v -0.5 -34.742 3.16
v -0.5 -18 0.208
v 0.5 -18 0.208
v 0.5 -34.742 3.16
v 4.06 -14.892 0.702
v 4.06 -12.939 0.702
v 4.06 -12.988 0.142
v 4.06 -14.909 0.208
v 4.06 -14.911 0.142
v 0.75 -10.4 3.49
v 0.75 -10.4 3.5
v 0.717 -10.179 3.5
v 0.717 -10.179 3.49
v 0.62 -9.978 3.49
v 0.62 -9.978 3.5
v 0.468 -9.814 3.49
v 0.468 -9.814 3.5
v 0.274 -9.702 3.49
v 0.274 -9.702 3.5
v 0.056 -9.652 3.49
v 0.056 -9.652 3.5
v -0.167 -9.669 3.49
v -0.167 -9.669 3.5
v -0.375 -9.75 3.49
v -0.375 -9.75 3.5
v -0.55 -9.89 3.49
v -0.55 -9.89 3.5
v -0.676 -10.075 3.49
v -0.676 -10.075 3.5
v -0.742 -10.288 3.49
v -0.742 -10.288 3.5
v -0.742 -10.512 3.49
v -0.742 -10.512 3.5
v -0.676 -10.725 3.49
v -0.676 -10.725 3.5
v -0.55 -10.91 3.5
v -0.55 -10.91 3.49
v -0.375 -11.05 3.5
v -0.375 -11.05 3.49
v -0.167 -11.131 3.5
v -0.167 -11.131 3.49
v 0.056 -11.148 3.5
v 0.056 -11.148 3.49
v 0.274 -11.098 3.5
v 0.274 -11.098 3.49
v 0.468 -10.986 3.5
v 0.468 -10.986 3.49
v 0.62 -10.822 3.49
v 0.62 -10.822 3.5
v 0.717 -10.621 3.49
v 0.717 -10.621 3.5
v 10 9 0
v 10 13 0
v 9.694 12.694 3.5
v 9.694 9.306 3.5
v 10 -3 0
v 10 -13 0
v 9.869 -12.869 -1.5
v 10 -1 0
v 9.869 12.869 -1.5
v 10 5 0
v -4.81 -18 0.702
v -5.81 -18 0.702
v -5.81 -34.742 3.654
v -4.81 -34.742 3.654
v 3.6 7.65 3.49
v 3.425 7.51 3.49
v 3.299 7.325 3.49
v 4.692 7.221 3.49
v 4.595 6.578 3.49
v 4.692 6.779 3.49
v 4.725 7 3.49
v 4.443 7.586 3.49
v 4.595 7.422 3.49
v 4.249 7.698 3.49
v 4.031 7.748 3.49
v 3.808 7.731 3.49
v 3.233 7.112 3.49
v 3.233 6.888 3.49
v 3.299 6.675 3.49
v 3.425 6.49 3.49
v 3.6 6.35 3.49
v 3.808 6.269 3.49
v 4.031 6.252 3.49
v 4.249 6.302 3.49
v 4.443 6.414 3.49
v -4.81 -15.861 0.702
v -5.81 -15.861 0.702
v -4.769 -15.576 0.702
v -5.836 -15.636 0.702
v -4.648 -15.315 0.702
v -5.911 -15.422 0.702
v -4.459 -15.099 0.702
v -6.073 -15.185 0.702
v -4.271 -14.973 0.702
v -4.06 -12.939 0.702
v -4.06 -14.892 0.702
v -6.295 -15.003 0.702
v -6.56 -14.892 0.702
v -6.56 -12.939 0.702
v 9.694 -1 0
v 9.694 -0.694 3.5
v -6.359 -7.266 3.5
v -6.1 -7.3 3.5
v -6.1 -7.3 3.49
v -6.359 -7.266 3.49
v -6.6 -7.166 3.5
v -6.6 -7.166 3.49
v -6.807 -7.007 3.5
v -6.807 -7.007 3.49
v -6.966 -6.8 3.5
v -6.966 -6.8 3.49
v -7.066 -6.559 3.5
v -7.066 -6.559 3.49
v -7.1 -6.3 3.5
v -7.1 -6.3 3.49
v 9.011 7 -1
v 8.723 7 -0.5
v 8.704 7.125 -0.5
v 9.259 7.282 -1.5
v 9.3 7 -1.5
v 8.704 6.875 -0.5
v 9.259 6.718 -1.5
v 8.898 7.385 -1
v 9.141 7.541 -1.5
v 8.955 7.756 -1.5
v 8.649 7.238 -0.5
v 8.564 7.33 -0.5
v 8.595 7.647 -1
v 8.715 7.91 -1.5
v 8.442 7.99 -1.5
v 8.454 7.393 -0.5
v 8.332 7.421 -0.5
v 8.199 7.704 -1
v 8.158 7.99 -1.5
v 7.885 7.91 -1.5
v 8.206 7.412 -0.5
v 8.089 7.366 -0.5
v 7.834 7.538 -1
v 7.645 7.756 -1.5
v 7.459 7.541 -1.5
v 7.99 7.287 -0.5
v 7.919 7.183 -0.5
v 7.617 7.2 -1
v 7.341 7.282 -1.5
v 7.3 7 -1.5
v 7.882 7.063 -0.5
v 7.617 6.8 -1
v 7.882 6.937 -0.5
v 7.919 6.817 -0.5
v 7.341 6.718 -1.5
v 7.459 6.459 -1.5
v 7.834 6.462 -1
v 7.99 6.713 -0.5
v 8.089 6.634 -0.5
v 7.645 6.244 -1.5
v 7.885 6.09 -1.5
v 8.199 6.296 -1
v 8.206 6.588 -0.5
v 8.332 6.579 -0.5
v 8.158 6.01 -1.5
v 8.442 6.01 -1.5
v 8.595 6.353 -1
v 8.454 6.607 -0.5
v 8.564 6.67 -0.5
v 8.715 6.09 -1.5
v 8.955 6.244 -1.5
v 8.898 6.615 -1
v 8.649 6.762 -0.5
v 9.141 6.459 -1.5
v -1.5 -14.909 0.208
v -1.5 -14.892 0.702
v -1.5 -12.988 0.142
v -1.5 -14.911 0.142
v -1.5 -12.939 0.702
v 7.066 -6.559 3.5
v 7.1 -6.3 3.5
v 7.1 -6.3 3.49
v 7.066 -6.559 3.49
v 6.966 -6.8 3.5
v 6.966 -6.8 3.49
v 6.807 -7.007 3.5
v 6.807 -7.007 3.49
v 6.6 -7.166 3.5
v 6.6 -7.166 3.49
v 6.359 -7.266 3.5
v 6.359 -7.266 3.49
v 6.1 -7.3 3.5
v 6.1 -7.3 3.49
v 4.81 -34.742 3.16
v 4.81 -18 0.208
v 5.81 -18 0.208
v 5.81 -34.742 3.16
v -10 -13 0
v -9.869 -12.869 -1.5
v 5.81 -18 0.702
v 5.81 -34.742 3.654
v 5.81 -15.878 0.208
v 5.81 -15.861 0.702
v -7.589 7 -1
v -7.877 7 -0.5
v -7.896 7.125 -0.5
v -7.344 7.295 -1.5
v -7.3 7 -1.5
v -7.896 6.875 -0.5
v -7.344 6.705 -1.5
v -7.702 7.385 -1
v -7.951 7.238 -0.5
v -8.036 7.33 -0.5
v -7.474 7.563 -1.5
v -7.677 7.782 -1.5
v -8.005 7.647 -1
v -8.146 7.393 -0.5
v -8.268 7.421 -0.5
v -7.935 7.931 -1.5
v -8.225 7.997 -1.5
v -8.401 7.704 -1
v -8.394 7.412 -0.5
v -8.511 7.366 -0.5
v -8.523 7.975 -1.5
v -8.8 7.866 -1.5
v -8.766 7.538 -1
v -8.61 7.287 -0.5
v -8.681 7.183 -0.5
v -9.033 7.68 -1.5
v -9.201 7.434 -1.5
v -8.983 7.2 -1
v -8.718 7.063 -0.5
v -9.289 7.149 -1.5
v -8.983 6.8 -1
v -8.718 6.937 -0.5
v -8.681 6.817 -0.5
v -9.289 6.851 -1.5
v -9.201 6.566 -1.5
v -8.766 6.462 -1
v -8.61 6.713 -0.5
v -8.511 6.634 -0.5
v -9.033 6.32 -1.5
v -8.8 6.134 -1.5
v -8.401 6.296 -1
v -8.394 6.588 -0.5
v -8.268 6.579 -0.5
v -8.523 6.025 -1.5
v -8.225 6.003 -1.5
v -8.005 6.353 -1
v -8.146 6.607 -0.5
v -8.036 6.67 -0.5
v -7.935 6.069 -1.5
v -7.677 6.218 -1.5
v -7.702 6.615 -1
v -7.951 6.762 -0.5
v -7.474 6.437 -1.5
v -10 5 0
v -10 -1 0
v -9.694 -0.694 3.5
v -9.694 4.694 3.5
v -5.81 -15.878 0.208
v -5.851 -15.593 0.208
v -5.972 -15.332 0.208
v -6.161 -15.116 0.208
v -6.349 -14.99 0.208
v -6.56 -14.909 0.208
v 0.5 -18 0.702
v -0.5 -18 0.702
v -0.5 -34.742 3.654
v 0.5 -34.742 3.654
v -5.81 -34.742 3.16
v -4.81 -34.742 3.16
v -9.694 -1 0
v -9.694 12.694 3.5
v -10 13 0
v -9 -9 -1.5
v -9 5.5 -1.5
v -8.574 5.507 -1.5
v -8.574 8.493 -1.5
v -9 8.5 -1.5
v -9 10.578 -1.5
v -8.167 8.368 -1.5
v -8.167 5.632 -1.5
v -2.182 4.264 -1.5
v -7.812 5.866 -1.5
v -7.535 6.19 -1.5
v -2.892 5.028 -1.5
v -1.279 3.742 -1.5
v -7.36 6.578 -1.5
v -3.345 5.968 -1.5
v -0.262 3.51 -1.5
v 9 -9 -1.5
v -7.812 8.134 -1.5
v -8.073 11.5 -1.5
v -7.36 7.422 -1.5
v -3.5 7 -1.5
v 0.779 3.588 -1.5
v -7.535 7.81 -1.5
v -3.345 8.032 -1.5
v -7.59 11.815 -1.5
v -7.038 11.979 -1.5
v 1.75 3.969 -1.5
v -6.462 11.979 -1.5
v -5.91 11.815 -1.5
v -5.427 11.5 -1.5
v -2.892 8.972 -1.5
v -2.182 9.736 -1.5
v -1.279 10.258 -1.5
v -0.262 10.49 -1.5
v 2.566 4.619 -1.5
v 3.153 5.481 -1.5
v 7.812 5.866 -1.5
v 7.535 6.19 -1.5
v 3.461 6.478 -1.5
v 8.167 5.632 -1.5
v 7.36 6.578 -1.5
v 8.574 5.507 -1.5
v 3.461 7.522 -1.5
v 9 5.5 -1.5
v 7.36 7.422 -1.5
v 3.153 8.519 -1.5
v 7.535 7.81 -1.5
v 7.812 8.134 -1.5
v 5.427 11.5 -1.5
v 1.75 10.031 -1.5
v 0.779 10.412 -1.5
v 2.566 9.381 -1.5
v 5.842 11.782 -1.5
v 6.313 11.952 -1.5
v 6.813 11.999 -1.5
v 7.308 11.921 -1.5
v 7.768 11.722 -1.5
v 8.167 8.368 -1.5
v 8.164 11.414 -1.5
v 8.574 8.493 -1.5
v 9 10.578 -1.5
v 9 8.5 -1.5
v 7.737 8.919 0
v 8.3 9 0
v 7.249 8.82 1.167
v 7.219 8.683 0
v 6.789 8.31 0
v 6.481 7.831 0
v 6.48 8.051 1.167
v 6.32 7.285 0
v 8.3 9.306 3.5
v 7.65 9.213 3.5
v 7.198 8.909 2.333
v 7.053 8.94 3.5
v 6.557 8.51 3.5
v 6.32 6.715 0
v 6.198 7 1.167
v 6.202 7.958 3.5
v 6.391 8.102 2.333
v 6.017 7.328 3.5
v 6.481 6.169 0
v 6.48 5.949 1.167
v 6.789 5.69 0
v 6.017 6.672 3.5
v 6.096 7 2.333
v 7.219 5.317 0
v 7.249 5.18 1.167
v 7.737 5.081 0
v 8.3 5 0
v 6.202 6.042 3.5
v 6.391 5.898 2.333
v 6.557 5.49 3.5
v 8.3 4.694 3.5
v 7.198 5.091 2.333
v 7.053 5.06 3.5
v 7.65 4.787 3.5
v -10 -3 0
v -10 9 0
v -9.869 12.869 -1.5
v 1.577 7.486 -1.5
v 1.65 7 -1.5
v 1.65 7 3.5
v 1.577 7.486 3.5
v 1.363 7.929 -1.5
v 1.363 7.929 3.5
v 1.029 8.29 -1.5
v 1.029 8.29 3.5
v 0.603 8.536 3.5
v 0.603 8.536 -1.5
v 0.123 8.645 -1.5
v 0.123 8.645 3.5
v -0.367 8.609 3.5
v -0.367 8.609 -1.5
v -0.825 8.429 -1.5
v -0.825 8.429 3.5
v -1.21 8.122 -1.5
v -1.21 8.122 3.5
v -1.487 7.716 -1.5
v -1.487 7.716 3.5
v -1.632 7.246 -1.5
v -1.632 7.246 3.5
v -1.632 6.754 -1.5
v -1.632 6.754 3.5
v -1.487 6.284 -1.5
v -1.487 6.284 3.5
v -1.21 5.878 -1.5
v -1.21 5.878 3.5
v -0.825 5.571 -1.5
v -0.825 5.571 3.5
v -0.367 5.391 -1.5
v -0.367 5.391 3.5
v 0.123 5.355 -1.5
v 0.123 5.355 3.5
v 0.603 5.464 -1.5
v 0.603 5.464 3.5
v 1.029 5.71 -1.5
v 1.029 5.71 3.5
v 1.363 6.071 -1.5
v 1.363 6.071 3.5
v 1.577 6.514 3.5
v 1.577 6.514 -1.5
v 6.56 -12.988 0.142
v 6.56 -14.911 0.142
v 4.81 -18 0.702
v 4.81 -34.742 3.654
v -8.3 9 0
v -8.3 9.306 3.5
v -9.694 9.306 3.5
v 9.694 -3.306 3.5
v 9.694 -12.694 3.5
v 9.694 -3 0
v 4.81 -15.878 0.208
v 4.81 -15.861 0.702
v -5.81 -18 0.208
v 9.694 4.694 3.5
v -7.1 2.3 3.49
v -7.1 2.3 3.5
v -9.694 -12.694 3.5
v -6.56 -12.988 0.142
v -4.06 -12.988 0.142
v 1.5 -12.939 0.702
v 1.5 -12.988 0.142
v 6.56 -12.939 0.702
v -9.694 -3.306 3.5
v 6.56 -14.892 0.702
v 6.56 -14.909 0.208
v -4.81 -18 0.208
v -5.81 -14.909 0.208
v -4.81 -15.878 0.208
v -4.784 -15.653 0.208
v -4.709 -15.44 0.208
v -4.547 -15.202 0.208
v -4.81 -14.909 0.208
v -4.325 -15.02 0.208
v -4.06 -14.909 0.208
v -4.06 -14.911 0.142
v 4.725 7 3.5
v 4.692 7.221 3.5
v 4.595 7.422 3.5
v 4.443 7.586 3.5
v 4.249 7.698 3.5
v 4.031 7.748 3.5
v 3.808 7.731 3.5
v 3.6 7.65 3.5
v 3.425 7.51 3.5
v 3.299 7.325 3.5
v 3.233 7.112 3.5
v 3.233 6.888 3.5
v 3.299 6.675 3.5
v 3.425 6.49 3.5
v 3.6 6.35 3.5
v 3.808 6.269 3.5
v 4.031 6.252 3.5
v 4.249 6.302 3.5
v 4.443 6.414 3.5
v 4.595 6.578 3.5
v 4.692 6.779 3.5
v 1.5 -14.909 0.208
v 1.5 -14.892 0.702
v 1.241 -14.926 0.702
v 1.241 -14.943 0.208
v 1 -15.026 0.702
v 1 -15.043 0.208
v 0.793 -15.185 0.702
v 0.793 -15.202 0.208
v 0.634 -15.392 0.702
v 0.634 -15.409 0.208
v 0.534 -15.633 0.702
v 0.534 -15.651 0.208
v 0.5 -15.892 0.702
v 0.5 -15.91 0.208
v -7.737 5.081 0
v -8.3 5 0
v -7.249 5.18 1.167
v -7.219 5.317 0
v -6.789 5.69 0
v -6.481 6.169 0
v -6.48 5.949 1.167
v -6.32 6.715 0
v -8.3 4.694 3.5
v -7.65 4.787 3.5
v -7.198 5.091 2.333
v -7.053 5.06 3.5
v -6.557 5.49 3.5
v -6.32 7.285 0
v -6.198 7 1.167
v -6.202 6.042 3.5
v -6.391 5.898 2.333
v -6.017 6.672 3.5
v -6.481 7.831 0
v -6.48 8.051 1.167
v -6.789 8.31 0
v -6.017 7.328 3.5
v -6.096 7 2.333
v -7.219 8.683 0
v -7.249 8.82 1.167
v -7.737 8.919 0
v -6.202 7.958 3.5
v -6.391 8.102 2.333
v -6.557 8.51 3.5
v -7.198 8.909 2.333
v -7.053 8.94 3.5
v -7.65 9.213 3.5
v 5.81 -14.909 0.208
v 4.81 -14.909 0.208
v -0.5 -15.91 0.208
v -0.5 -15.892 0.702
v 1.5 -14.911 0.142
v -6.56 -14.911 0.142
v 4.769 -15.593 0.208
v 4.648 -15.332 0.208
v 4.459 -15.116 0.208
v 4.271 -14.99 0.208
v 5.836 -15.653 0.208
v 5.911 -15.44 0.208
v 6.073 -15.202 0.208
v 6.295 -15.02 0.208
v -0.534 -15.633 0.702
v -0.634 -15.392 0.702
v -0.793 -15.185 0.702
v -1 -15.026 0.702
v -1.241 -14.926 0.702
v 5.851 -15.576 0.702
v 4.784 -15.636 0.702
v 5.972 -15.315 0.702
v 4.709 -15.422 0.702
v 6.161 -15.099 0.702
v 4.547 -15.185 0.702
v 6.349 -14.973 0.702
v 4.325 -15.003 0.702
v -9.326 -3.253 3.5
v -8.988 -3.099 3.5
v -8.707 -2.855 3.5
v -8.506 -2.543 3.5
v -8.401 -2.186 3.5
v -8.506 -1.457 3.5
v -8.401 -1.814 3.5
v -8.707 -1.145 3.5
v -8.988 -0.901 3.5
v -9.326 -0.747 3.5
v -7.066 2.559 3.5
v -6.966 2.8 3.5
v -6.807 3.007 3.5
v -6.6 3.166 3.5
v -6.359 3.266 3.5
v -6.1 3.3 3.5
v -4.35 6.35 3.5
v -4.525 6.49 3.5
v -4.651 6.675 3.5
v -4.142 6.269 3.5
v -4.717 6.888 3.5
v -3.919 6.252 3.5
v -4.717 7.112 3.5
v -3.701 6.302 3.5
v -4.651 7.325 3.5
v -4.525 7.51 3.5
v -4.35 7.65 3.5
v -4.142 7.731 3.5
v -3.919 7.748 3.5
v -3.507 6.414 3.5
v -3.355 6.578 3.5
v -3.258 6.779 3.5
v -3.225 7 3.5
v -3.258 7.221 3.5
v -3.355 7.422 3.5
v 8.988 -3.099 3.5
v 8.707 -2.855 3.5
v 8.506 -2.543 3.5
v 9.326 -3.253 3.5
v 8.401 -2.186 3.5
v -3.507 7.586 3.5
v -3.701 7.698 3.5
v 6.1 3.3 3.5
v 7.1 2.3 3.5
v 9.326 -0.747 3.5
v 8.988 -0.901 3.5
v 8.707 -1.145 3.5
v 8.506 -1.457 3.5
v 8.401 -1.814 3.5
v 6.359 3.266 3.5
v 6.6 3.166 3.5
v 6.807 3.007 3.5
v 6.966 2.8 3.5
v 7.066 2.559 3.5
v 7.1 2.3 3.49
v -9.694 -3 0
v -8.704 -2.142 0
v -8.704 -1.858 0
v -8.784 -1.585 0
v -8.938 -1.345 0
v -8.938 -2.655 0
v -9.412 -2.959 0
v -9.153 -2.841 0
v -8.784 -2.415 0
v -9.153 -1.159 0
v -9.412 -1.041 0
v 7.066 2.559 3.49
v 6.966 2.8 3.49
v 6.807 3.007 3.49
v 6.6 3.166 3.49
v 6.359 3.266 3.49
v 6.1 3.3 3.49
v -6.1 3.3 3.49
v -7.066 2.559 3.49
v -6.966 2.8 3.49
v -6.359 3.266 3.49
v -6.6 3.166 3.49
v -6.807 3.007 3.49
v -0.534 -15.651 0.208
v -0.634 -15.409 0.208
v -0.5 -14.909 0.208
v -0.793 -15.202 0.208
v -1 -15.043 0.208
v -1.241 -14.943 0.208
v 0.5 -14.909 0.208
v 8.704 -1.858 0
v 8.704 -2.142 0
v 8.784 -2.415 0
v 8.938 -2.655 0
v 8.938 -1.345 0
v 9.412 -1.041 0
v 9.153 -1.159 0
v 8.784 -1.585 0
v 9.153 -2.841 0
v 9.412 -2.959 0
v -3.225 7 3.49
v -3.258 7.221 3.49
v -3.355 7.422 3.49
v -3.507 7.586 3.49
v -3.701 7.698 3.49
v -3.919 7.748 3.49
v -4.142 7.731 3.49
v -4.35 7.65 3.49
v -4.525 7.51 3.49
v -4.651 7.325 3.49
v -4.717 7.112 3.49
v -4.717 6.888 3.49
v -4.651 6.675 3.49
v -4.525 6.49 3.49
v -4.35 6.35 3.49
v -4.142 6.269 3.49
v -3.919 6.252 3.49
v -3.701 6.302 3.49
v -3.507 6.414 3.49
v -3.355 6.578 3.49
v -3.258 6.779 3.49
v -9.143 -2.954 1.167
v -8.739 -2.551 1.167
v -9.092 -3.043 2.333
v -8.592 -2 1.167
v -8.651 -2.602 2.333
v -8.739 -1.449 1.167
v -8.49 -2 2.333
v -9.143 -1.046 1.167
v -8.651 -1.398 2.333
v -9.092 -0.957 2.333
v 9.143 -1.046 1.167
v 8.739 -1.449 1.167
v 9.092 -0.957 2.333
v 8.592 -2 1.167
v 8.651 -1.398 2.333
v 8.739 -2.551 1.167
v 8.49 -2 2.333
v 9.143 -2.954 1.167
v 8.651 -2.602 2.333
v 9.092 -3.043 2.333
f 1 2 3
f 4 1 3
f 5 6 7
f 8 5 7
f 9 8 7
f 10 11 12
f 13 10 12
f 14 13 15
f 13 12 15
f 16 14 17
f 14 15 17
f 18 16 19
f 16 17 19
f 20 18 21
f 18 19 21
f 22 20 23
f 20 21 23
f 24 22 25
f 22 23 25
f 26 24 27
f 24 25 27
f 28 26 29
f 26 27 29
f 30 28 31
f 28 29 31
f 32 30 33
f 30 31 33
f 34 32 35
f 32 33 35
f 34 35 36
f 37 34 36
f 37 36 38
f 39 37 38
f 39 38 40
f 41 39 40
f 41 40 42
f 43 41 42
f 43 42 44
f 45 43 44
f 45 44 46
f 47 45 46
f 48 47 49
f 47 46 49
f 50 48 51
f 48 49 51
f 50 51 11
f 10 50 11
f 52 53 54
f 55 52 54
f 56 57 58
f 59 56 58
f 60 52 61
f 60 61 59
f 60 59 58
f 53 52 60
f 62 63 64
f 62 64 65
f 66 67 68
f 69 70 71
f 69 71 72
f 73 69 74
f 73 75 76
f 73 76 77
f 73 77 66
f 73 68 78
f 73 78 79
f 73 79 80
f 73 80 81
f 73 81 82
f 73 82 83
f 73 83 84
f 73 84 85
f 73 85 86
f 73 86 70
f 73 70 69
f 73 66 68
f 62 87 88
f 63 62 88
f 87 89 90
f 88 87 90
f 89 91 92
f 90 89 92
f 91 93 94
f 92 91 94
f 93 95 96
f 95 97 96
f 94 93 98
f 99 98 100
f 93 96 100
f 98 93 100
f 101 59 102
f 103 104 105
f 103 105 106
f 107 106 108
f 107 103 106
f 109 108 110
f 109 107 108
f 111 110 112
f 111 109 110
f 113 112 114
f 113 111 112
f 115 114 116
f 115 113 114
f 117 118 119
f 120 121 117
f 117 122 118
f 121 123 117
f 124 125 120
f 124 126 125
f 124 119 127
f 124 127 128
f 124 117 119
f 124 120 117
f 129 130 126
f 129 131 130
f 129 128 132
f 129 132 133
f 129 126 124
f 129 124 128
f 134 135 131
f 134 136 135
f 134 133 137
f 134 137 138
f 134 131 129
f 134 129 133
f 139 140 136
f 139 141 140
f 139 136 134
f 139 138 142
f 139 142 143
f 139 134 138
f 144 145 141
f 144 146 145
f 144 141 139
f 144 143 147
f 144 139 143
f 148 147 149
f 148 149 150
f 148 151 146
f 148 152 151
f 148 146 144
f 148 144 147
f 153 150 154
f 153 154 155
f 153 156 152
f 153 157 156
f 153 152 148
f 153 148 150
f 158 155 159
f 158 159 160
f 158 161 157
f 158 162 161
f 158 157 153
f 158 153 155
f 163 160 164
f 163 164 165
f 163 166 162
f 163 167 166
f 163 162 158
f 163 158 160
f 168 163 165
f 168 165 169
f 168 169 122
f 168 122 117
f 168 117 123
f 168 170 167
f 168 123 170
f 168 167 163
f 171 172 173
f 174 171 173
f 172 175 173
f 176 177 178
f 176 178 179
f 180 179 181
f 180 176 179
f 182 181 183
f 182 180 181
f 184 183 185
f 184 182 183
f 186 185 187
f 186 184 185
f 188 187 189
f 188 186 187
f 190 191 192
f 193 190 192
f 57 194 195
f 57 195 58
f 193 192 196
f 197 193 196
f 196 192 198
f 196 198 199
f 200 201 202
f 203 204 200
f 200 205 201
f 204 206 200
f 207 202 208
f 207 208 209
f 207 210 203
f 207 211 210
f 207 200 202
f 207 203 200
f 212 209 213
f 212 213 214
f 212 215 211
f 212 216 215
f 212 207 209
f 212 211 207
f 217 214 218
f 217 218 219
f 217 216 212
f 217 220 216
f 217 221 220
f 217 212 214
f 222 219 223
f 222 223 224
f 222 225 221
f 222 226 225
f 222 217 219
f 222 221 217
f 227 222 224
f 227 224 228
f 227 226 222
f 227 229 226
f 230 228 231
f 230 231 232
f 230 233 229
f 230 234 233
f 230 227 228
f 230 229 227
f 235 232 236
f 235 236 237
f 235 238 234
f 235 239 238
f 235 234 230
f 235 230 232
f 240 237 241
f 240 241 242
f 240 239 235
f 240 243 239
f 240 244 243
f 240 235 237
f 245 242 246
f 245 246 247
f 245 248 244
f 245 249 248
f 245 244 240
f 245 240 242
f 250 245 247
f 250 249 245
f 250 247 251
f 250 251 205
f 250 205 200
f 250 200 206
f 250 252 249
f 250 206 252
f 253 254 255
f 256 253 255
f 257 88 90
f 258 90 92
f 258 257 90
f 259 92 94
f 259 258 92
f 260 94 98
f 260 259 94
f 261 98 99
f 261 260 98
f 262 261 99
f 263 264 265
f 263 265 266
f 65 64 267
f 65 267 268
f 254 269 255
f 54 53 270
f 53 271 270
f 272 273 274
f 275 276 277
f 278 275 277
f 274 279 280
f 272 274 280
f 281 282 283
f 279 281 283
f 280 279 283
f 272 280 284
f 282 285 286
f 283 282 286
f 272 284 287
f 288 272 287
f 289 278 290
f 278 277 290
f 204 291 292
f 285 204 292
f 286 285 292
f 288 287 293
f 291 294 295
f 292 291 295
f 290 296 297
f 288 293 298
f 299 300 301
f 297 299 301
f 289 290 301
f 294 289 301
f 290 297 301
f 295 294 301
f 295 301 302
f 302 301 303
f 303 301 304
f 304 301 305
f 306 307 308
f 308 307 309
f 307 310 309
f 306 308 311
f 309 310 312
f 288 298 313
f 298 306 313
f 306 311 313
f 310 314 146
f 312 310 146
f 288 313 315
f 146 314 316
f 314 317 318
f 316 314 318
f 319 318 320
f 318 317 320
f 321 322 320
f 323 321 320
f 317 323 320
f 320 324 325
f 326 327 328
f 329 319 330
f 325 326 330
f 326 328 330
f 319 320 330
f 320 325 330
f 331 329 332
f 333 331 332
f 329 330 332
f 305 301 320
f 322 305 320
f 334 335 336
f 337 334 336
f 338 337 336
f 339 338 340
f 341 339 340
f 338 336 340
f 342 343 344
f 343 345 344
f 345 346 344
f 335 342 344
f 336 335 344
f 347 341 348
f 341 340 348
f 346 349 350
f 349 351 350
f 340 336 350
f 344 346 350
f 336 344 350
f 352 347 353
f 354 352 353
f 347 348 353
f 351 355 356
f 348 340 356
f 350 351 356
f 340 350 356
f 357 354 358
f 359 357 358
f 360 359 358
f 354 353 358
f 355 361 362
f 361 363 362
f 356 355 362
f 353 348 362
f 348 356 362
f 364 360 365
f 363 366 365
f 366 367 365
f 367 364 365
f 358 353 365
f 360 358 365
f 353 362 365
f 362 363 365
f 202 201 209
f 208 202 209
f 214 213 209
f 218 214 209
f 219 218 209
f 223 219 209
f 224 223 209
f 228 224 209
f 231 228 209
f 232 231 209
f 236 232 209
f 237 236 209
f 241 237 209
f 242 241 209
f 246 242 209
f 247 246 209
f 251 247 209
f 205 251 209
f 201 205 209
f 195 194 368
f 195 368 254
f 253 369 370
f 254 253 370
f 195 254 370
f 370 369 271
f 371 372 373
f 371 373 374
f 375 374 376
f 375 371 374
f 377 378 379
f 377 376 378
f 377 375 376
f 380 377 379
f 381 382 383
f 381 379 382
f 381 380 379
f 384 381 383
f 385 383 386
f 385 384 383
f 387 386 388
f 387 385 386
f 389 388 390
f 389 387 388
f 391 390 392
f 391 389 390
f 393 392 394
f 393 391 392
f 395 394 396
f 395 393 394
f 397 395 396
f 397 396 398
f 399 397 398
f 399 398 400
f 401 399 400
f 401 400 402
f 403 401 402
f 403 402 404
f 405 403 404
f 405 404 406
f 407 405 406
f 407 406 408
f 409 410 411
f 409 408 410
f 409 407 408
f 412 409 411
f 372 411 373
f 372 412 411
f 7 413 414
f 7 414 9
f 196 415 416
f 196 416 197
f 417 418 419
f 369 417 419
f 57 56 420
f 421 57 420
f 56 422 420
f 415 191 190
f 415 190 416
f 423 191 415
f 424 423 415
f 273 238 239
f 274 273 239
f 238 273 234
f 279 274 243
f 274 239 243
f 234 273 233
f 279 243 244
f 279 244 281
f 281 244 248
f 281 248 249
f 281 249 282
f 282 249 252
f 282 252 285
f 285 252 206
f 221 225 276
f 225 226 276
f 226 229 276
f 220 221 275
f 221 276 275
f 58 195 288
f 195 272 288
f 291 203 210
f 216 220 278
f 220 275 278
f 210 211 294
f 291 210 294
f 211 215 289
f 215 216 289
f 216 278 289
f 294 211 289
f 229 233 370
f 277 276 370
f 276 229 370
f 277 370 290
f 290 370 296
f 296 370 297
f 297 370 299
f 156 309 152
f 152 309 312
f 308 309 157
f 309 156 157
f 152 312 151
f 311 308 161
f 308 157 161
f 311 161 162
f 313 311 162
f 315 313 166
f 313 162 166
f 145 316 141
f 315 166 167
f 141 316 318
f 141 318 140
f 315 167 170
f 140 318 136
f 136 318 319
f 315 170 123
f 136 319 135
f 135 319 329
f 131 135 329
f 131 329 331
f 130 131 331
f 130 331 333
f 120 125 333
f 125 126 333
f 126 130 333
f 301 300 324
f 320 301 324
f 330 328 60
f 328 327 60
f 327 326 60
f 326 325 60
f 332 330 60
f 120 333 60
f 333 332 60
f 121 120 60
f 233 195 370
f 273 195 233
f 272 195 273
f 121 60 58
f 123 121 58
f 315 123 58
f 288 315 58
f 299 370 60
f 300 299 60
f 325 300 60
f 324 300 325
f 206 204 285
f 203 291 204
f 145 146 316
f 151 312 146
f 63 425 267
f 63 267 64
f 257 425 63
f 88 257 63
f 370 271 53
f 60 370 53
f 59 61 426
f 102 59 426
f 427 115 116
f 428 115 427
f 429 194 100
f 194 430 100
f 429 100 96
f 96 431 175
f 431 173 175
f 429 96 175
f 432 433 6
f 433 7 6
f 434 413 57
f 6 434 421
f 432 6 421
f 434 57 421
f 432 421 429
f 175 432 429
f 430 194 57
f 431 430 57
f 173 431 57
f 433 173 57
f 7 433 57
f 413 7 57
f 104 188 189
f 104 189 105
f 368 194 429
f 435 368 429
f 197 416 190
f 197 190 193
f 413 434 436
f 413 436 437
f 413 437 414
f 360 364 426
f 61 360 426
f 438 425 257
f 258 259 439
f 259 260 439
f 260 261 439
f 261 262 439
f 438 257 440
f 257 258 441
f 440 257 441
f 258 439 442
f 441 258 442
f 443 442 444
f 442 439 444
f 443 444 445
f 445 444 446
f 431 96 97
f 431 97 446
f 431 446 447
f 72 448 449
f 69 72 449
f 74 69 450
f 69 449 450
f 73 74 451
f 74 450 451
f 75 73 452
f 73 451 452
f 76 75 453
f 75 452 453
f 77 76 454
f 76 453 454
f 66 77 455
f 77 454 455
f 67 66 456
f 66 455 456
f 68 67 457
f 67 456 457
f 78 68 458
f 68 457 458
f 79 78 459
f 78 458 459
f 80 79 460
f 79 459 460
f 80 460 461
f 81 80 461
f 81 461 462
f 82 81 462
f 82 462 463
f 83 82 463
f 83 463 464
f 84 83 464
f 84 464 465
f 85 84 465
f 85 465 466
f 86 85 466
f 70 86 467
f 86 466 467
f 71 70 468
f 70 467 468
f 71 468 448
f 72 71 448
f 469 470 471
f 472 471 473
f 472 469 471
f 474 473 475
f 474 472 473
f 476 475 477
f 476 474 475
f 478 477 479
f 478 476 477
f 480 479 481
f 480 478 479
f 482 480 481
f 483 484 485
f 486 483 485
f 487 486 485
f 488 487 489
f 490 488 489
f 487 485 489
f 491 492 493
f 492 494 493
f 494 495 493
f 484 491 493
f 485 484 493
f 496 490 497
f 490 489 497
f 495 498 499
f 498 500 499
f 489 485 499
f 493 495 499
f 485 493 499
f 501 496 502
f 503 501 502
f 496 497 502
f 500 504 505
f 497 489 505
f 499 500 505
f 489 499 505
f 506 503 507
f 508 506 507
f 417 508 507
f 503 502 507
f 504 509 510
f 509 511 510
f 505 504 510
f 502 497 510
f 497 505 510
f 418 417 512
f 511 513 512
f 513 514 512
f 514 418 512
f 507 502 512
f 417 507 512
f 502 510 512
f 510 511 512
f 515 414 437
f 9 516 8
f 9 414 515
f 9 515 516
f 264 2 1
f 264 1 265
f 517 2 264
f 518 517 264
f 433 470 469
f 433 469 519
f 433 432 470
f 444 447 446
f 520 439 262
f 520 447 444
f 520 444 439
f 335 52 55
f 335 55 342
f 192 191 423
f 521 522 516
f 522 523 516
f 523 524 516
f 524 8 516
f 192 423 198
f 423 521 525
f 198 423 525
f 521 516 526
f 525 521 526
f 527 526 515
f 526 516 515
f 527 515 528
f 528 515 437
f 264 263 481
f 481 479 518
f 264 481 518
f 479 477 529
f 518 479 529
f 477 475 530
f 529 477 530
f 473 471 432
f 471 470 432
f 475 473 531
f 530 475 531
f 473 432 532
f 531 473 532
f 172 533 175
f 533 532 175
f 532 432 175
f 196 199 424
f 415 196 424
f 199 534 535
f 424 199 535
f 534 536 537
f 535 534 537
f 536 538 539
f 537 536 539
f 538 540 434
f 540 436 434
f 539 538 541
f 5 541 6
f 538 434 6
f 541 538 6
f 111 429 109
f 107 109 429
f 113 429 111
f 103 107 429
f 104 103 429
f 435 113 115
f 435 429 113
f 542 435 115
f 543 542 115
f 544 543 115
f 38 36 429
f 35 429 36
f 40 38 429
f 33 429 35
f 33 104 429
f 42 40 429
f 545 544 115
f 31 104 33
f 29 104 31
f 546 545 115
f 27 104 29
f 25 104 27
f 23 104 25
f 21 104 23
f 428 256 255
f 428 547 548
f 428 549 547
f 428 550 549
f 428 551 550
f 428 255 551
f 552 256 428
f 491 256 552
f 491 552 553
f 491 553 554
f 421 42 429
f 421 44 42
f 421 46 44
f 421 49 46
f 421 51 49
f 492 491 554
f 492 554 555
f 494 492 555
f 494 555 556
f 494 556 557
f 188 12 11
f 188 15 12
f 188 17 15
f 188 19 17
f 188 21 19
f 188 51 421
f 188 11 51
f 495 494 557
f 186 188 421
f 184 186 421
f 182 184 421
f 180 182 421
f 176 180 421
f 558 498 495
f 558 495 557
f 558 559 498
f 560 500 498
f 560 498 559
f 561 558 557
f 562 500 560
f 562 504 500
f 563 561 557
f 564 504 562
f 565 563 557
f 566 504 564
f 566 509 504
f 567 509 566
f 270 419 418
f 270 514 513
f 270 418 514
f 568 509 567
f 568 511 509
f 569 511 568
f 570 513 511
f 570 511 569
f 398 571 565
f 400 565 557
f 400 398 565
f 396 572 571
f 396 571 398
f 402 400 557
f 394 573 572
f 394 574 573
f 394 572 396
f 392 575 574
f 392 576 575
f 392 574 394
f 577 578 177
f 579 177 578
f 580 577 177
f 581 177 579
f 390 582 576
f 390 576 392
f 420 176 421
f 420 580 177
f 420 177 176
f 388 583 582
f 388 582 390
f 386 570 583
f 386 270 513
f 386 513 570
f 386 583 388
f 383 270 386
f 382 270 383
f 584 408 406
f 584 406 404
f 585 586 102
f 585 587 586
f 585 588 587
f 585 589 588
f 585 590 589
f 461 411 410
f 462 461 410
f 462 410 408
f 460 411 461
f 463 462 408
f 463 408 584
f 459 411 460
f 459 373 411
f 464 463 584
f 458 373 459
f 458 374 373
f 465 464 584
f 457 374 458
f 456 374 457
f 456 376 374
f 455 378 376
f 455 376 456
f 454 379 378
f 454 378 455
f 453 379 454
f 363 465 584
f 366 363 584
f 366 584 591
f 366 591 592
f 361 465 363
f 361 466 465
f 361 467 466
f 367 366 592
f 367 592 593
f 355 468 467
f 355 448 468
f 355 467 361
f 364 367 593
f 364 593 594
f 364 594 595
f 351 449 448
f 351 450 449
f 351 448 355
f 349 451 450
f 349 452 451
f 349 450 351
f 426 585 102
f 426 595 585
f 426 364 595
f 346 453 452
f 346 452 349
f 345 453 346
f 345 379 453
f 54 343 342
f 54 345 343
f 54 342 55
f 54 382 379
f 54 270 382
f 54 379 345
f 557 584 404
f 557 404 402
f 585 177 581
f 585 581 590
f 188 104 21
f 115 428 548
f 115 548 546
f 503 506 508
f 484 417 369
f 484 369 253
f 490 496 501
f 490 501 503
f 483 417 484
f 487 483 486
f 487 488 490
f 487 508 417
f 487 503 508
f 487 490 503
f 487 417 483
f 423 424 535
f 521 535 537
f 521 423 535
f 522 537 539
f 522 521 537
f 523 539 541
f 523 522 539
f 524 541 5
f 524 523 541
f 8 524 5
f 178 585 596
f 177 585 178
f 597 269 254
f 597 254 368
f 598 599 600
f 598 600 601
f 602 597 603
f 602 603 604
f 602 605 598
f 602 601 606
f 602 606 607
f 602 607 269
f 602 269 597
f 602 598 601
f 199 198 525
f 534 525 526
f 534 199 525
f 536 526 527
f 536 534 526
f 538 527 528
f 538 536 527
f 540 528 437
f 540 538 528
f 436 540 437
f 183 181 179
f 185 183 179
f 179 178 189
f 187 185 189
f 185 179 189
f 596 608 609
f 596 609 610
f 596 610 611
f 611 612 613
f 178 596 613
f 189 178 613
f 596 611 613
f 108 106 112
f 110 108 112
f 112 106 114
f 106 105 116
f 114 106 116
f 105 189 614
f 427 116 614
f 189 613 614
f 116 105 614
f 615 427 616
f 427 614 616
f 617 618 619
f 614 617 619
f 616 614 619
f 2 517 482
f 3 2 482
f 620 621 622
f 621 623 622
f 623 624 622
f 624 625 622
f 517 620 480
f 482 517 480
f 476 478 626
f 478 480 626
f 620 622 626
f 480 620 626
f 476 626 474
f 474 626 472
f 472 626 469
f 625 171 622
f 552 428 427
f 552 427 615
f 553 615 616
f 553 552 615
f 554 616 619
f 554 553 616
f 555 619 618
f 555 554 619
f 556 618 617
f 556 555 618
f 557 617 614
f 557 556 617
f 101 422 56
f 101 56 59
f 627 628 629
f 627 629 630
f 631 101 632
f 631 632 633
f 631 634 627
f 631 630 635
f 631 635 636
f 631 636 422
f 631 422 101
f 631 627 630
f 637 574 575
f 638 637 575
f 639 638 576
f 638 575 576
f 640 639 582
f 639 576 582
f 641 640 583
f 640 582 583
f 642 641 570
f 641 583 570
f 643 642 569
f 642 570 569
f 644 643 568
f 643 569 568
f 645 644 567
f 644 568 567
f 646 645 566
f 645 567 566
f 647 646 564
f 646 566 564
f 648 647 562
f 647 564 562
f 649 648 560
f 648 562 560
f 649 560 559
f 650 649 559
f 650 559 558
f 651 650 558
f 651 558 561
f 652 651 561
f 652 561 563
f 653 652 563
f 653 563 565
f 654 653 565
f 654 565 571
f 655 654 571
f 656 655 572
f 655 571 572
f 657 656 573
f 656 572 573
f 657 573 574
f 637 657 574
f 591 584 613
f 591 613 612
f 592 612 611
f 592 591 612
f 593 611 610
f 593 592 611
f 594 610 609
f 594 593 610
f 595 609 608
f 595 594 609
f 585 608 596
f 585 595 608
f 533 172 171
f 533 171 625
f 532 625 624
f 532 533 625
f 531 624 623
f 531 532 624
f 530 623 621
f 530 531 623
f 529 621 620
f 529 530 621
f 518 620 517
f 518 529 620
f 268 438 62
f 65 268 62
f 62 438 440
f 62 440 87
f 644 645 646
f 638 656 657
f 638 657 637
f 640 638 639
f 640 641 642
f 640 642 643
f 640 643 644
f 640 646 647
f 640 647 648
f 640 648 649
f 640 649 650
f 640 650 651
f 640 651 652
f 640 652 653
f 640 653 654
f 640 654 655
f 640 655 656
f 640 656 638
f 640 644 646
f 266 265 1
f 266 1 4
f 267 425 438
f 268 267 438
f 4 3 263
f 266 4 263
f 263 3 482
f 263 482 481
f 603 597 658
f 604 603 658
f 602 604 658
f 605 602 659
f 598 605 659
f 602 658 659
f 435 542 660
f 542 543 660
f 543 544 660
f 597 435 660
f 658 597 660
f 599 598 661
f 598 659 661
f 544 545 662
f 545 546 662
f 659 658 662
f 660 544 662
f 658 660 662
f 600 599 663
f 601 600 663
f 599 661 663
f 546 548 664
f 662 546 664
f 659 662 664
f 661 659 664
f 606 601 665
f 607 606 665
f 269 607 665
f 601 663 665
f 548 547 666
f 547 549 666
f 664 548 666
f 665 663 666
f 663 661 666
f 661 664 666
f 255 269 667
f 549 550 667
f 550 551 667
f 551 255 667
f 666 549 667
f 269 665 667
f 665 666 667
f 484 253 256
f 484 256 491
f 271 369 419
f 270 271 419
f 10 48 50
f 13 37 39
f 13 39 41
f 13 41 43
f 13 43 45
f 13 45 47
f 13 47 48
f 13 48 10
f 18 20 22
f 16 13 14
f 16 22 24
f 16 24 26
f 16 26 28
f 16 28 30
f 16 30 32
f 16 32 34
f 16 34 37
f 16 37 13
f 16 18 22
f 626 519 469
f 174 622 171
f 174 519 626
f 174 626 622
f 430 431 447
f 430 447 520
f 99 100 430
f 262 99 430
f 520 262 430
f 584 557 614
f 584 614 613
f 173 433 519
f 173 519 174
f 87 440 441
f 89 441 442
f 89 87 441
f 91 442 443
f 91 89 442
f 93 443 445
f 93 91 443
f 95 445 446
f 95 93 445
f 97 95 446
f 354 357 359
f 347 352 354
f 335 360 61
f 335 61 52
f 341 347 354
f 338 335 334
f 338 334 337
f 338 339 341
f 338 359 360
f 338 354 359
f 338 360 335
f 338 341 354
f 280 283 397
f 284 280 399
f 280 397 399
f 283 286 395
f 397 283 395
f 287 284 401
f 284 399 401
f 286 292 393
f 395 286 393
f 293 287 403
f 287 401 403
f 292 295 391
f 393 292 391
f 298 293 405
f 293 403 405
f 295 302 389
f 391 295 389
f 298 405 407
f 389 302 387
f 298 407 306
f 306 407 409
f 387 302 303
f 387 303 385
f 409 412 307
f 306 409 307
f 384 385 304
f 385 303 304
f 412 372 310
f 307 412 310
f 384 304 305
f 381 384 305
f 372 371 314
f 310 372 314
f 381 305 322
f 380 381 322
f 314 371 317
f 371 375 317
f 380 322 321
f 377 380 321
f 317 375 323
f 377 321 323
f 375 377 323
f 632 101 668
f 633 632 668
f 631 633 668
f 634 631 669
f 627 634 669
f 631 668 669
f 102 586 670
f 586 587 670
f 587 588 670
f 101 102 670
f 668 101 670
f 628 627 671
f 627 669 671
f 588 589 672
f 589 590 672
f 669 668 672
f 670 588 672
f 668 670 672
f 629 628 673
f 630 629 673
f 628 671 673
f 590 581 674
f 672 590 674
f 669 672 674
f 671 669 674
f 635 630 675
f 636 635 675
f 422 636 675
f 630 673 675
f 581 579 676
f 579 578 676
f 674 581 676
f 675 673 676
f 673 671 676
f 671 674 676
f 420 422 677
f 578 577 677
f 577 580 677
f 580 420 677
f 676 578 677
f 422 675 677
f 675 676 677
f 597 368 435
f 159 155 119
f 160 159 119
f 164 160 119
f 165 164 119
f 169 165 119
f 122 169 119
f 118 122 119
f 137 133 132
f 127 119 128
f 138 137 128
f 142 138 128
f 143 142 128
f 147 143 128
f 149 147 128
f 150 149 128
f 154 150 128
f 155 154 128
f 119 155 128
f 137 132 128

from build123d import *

# Parameters (mm, degrees)
SKETCH1_W                    = 20
SKETCH1_H                    = 26
BOSS_EXTRUDE1_DEPTH          = 1.5
BOSS_EXTRUDE1_DRAFT          = -5
SKETCH1_2_W                  = 20
SKETCH1_2_H                  = 26
BOSS_EXTRUDE2_DEPTH          = 3.5
BOSS_EXTRUDE2_TAPER          = 5
CUT_EXTRUDE1_DEPTH           = 3.5
CUT_EXTRUDE1_TAPER           = -5
CUT_EXTRUDE1_2_DEPTH         = 3.5
CUT_EXTRUDE1_2_TAPER         = -5
CUT_EXTRUDE1_3_DEPTH         = 3.5
CUT_EXTRUDE1_3_TAPER         = -5
CUT_EXTRUDE1_4_DEPTH         = 3.5
CUT_EXTRUDE1_4_TAPER         = -5
CUT_EXTRUDE3_DEPTH           = 17.770509989
CUT_EXTRUDE3_DEPTH_BACK      = 17.770509989
SKETCH5_5_R                  = 1.65
CUT_EXTRUDE4_START           = 3.5
SKETCH5_8_R                  = 0.75
CUT_EXTRUDE4_DEPTH           = 0.01
CUT_EXTRUDE5_START           = -1.5
SKETCH5_9_R                  = 1
CUT_EXTRUDE5_DEPTH           = 1
CUT_EXTRUDE5_DRAFT           = 30
CUT_EXTRUDE5_PROFILE_2_DEPTH = 1
CUT_EXTRUDE5_PROFILE_2_DRAFT = 30
SKETCH6_R                    = 3.5
CUT_EXTRUDE6_DEPTH           = 0.0001
SKETCH7_W                    = 3
SKETCH7_H                    = 0.56
SKETCH7_W_2                  = 2.5
BOSS_EXTRUDE3_DEPTH          = 2.1
SKETCH8_W                    = 1
SKETCH8_H                    = 0.493588666
BOSS_EXTRUDE4_DEPTH          = 18
FILLET1_R                    = 1
CUT_EXTRUDE7_DEPTH           = 35.508424571
CUT_EXTRUDE7_DEPTH_BACK      = 35.508424571
SKETCH9_W                    = 11.62
SKETCH9_H                    = 15
SKETCH12_W                   = 1
SKETCH12_H                   = 0.493286698
BOSS_EXTRUDE5_DEPTH          = 17


# Read off the part's stored shape, not the designer's step: Cut-Extrude1
with BuildPart() as part:
    # Sketch1 → Boss-Extrude1 (with draft: the straight prism first)
    with BuildSketch(Plane.XY):
        Rectangle(SKETCH1_W, SKETCH1_H)
    extrude(amount=-BOSS_EXTRUDE1_DEPTH)
    # Boss-Extrude1: the draft: its side faces are tilted about the plane it starts from
    boss_extrude1_sides = [part.faces().sort_by_distance(p)[0] for p in [
        (-10, 0, -0.75),
        (0, -13, -0.75),
        (10, 0, -0.75),
        (0, 13, -0.75),
    ]]
    draft(boss_extrude1_sides, Plane.XY, BOSS_EXTRUDE1_DRAFT)

    # Sketch1<2> → Boss-Extrude2 (add)
    with BuildSketch(Plane.XY):
        Rectangle(SKETCH1_2_W, SKETCH1_2_H)
    extrude(amount=BOSS_EXTRUDE2_DEPTH, taper=BOSS_EXTRUDE2_TAPER)

    # Cut-Extrude1 outline → Cut-Extrude1 (cut)
    with BuildSketch(Plane.XY):
        with BuildLine():
            Line((10, -1), (9.693789678, -1))
            ThreePointArc((9.693789678, -1), (8.693789678, -2), (9.693789678, -3))
            Line((9.693789678, -3), (10, -3))
            Line((10, -3), (10, -1))
        make_face()
    extrude(amount=CUT_EXTRUDE1_DEPTH, taper=CUT_EXTRUDE1_TAPER, mode=Mode.SUBTRACT)

    # Cut-Extrude1 2 outline → Cut-Extrude1 2 (cut)
    with BuildSketch(Plane.XY):
        with BuildLine():
            Line((-9.693789678, -1), (-10, -1))
            Line((-10, -1), (-10, -3))
            Line((-10, -3), (-9.693789678, -3))
            ThreePointArc((-9.693789678, -3), (-8.693789678, -2), (-9.693789678, -1))
        make_face()
    extrude(amount=CUT_EXTRUDE1_2_DEPTH, taper=CUT_EXTRUDE1_2_TAPER, mode=Mode.SUBTRACT)

    # Cut-Extrude1 3 outline → Cut-Extrude1 3 (cut)
    with BuildSketch(Plane.XY):
        with BuildLine():
            Line((-8.3, 9), (-10, 9))
            Line((-10, 9), (-10, 5))
            Line((-10, 5), (-8.3, 5))
            ThreePointArc((-8.3, 5), (-6.3, 7), (-8.3, 9))
        make_face()
    extrude(amount=CUT_EXTRUDE1_3_DEPTH, taper=CUT_EXTRUDE1_3_TAPER, mode=Mode.SUBTRACT)

    # Cut-Extrude1 4 outline → Cut-Extrude1 4 (cut)
    with BuildSketch(Plane.XY):
        with BuildLine():
            Line((10, 9), (8.3, 9))
            ThreePointArc((8.3, 9), (6.3, 7), (8.3, 5))
            Line((8.3, 5), (10, 5))
            Line((10, 5), (10, 9))
        make_face()
    extrude(amount=CUT_EXTRUDE1_4_DEPTH, taper=CUT_EXTRUDE1_4_TAPER, mode=Mode.SUBTRACT)

    # Sketch5<5> → Cut-Extrude3 (cut, two sides: drawn at the far end of the back side and taken through both)
    with BuildSketch(Plane.XY.offset(-CUT_EXTRUDE3_DEPTH_BACK)):
        with Locations((0, 7)):
            Circle(SKETCH5_5_R)
    extrude(amount=CUT_EXTRUDE3_DEPTH + CUT_EXTRUDE3_DEPTH_BACK, mode=Mode.SUBTRACT)

    # Sketch5<8> → Cut-Extrude4 (cut)
    with BuildSketch(Plane.XY.offset(CUT_EXTRUDE4_START)):
        with Locations((3.975, 7)):
            Circle(SKETCH5_8_R)
        with Locations((-3.975, 7)):
            Circle(SKETCH5_8_R)
        with Locations((0, -10.4)):
            Circle(SKETCH5_8_R)
        with BuildLine():
            Line((-6.1, 3.3), (6.1, 3.3))
            ThreePointArc((6.1, 3.3), (6.807106781, 3.007106781), (7.1, 2.3))
            Line((7.1, 2.3), (7.1, -6.3))
            ThreePointArc((7.1, -6.3), (6.807106781, -7.007106781), (6.1, -7.3))
            Line((6.1, -7.3), (-6.1, -7.3))
            ThreePointArc((-6.1, -7.3), (-6.807106781, -7.007106781), (-7.1, -6.3))
            Line((-7.1, -6.3), (-7.1, 2.3))
            ThreePointArc((-7.1, 2.3), (-6.807106781, 3.007106781), (-6.1, 3.3))
        make_face()
    extrude(amount=-CUT_EXTRUDE4_DEPTH, mode=Mode.SUBTRACT)


with BuildPart() as cut_extrude5_tool:
    # Sketch5<9> → Cut-Extrude5 (with draft: the straight prism first)
    with BuildSketch(Plane.XY.offset(CUT_EXTRUDE5_START)):
        with Locations((8.3, 7)):
            Circle(SKETCH5_9_R)
    extrude(amount=CUT_EXTRUDE5_DEPTH)
    # Cut-Extrude5: the draft: its side faces are tilted about the plane it starts from
    cut_extrude5_sides = [cut_extrude5_tool.faces().sort_by_distance(p)[0] for p in [
        (7.3, 7, -1),
    ]]
    draft(cut_extrude5_sides, Plane.XY.offset(CUT_EXTRUDE5_START), CUT_EXTRUDE5_DRAFT)


with BuildPart() as part_1:
    add(part.part)

    # Cut-Extrude5: cut by cut_extrude5_tool
    add(cut_extrude5_tool.part, mode=Mode.SUBTRACT)


with BuildPart() as cut_extrude5_profile_2_tool:
    # Sketch5<9> → Cut-Extrude5 profile 2 (with draft: the straight prism first)
    with BuildSketch(Plane.XY.offset(CUT_EXTRUDE5_START)):
        with Locations((-8.3, 7)):
            Circle(SKETCH5_9_R)
    extrude(amount=CUT_EXTRUDE5_PROFILE_2_DEPTH)
    # Cut-Extrude5 profile 2: the draft: its side faces are tilted about the plane it starts from
    cut_extrude5_profile_2_sides = [cut_extrude5_profile_2_tool.faces().sort_by_distance(p)[0] for p in [
        (-9.3, 7, -1),
    ]]
    draft(cut_extrude5_profile_2_sides, Plane.XY.offset(CUT_EXTRUDE5_START), CUT_EXTRUDE5_PROFILE_2_DRAFT)


with BuildPart() as part_2:
    add(part_1.part)

    # Cut-Extrude5 profile 2: cut by cut_extrude5_profile_2_tool
    add(cut_extrude5_profile_2_tool.part, mode=Mode.SUBTRACT)

    # Sketch6 → Cut-Extrude6 (cut)
    with BuildSketch(Plane(origin=(0, 0, -1.5), x_dir=(-1, 0, 0), z_dir=(0, 0, -1))):
        with BuildLine():
            Line((-5.427124344, 11.5), (5.427124344, 11.5))
            ThreePointArc((5.427124344, 11.5), (6.75, 12), (8.072875656, 11.5))
            Line((8.072875656, 11.5), (9, 10.578427125))
            Line((9, 10.578427125), (9, 8.5))
            ThreePointArc((9, 8.5), (7.3, 7), (9, 5.5))
            Line((9, 5.5), (9, -9))
            Line((9, -9), (-9, -9))
            Line((-9, -9), (-9, 5.5))
            ThreePointArc((-9, 5.5), (-7.3, 7), (-9, 8.5))
            Line((-9, 8.5), (-9, 10.578427125))
            Line((-9, 10.578427125), (-8.164213562, 11.414213562))
            ThreePointArc((-8.164213562, 11.414213562), (-6.812653663, 11.999018389), (-5.427124344, 11.5))
        make_face()
        with Locations((0, 7)):
            Circle(SKETCH6_R, mode=Mode.SUBTRACT)
    extrude(amount=-CUT_EXTRUDE6_DEPTH, mode=Mode.SUBTRACT)

    # Sketch7 → Boss-Extrude3 (add, along a direction that is not the sketch's normal)
    with BuildSketch(Plane(origin=(0, -12.800597138, 0.447962854), x_dir=(-1, 0, 0), z_dir=(0, -0.9993882205697596, 0.034974055904479696))):
        with Locations((0, 0.026094538)):
            Rectangle(SKETCH7_W, SKETCH7_H)
        with Locations((-5.31, 0.026094538)):
            Rectangle(SKETCH7_W_2, SKETCH7_H)
        with Locations((5.31, 0.026094538)):
            Rectangle(SKETCH7_W_2, SKETCH7_H)
    extrude(amount=BOSS_EXTRUDE3_DEPTH, dir=(0, -1, 0))

    # Sketch8 → Boss-Extrude4 (add, along a direction that is not the sketch's normal)
    with BuildSketch(Plane(origin=(0, -14.89802845, 0.521363439), x_dir=(1, 0, 0), z_dir=(0, -0.9993882205697596, 0.03497405590447946))):
        with Locations((5.31, -0.066334388)):
            Rectangle(SKETCH8_W, SKETCH8_H)
        with Locations((0, -0.066334388)):
            Rectangle(SKETCH8_W, SKETCH8_H)
        with Locations((-5.31, -0.066334388)):
            Rectangle(SKETCH8_W, SKETCH8_H)
    extrude(amount=BOSS_EXTRUDE4_DEPTH, dir=(0, -1, 0))

    # Fillet1
    # the kernel refuses this fillet: 1 mm, written as the material it adds along each edge
    with BuildSketch(Plane(origin=(4.81, -14.993638542, -2.210707425), x_dir=(-1, 0, 0), z_dir=(0, 0.03497405590447946, 0.9993882205697596))) as fillet1_piece_1_section:
        with BuildLine():
            CenterArc((1, 0.968245837), FILLET1_R, 180, 75.522487814)
            Line((0, 0.968245837), (-0.02, 0.968245837))
            Line((-0.02, 0.968245837), (-0.02, 0))
            Line((-0.02, 0), (0, -0.02))
            ThreePointArc((0, -0.02), (0.375, -0.02), (0.745, -0.019364917))
            Line((0.745, -0.019364917), (0.75, 0))
        make_face()
    fillet1_piece_1 = extrude(amount=5.334817848, mode=Mode.PRIVATE)
    fillet1_piece_1 = split(fillet1_piece_1, bisect_by=Plane(origin=(4.620408244, -15.128632193, 0.701712982), z_dir=(0, 0, -1)), keep=Keep.TOP, mode=Mode.PRIVATE)
    fillet1_piece_1 = split(fillet1_piece_1, bisect_by=Plane(origin=(4.620408244, -15.128632193, 0.208426284), z_dir=(0, 0, 1)), keep=Keep.TOP, mode=Mode.PRIVATE)
    add(fillet1_piece_1)
    with BuildSketch(Plane(origin=(5.81, -14.807058324, 3.120846692), x_dir=(1, 0, 0), z_dir=(0, -0.03497405590447946, -0.9993882205697596))) as fillet1_piece_2_section:
        with BuildLine():
            CenterArc((1, 0.968245837), FILLET1_R, 180, 75.522487814)
            Line((0, 0.968245837), (-0.02, 0.968245837))
            Line((-0.02, 0.968245837), (-0.02, 0))
            Line((-0.02, 0), (0, -0.02))
            ThreePointArc((0, -0.02), (0.375, -0.02), (0.745, -0.019364917))
            Line((0.745, -0.019364917), (0.75, 0))
        make_face()
    fillet1_piece_2 = extrude(amount=5.334817848, mode=Mode.PRIVATE)
    fillet1_piece_2 = split(fillet1_piece_2, bisect_by=Plane(origin=(5.999591756, -15.128632193, 0.701712982), z_dir=(0, 0, -1)), keep=Keep.TOP, mode=Mode.PRIVATE)
    fillet1_piece_2 = split(fillet1_piece_2, bisect_by=Plane(origin=(5.999591756, -15.128632193, 0.208426284), z_dir=(0, 0, 1)), keep=Keep.TOP, mode=Mode.PRIVATE)
    add(fillet1_piece_2)
    with BuildSketch(Plane(origin=(0.5, -14.996414972, -2.290044267), x_dir=(1, 0, 0), z_dir=(0, 0.03497405590447946, 0.9993882205697596))) as fillet1_piece_3_section:
        with BuildLine():
            CenterArc((FILLET1_R, -FILLET1_R), FILLET1_R, 90, 90)
            Line((0, -FILLET1_R), (-FILLET1_R * 0.02, -FILLET1_R))
            Line((-FILLET1_R * 0.02, -FILLET1_R), (-FILLET1_R * 0.02, FILLET1_R * 0.02))
            Line((-FILLET1_R * 0.02, FILLET1_R * 0.02), (FILLET1_R, FILLET1_R * 0.02))
            Line((FILLET1_R, FILLET1_R * 0.02), (FILLET1_R, 0))
        make_face()
    fillet1_piece_3 = extrude(amount=5.493588666, mode=Mode.PRIVATE)
    fillet1_piece_3 = split(fillet1_piece_3, bisect_by=Plane(origin=(0.726395114, -15.126882136, 0.701712982), z_dir=(0, 0, -1)), keep=Keep.TOP, mode=Mode.PRIVATE)
    fillet1_piece_3 = split(fillet1_piece_3, bisect_by=Plane(origin=(0.726395114, -15.126882136, 0.208426284), z_dir=(0, 0, 1)), keep=Keep.TOP, mode=Mode.PRIVATE)
    add(fillet1_piece_3)
    with BuildSketch(Plane(origin=(-0.5, -14.804281894, 3.200183534), x_dir=(-1, 0, 0), z_dir=(0, -0.03497405590447946, -0.9993882205697596))) as fillet1_piece_4_section:
        with BuildLine():
            CenterArc((FILLET1_R, -FILLET1_R), FILLET1_R, 90, 90)
            Line((0, -FILLET1_R), (-FILLET1_R * 0.02, -FILLET1_R))
            Line((-FILLET1_R * 0.02, -FILLET1_R), (-FILLET1_R * 0.02, FILLET1_R * 0.02))
            Line((-FILLET1_R * 0.02, FILLET1_R * 0.02), (FILLET1_R, FILLET1_R * 0.02))
            Line((FILLET1_R, FILLET1_R * 0.02), (FILLET1_R, 0))
        make_face()
    fillet1_piece_4 = extrude(amount=5.493588666, mode=Mode.PRIVATE)
    fillet1_piece_4 = split(fillet1_piece_4, bisect_by=Plane(origin=(-0.726395114, -15.126882136, 0.701712982), z_dir=(0, 0, -1)), keep=Keep.TOP, mode=Mode.PRIVATE)
    fillet1_piece_4 = split(fillet1_piece_4, bisect_by=Plane(origin=(-0.726395114, -15.126882136, 0.208426284), z_dir=(0, 0, 1)), keep=Keep.TOP, mode=Mode.PRIVATE)
    add(fillet1_piece_4)
    with BuildSketch(Plane(origin=(-5.81, -14.993638542, -2.210707425), x_dir=(-1, 0, 0), z_dir=(0, 0.03497405590447946, 0.9993882205697596))) as fillet1_piece_5_section:
        with BuildLine():
            CenterArc((1, 0.968245837), FILLET1_R, 180, 75.522487814)
            Line((0, 0.968245837), (-0.02, 0.968245837))
            Line((-0.02, 0.968245837), (-0.02, 0))
            Line((-0.02, 0), (0, -0.02))
            ThreePointArc((0, -0.02), (0.375, -0.02), (0.745, -0.019364917))
            Line((0.745, -0.019364917), (0.75, 0))
        make_face()
    fillet1_piece_5 = extrude(amount=5.334817848, mode=Mode.PRIVATE)
    fillet1_piece_5 = split(fillet1_piece_5, bisect_by=Plane(origin=(-5.999591756, -15.128632193, 0.701712982), z_dir=(0, 0, -1)), keep=Keep.TOP, mode=Mode.PRIVATE)
    fillet1_piece_5 = split(fillet1_piece_5, bisect_by=Plane(origin=(-5.999591756, -15.128632193, 0.208426284), z_dir=(0, 0, 1)), keep=Keep.TOP, mode=Mode.PRIVATE)
    add(fillet1_piece_5)
    with BuildSketch(Plane(origin=(-4.81, -14.807058324, 3.120846692), x_dir=(1, 0, 0), z_dir=(0, -0.03497405590447946, -0.9993882205697596))) as fillet1_piece_6_section:
        with BuildLine():
            CenterArc((1, 0.968245837), FILLET1_R, 180, 75.522487814)
            Line((0, 0.968245837), (-0.02, 0.968245837))
            Line((-0.02, 0.968245837), (-0.02, 0))
            Line((-0.02, 0), (0, -0.02))
            ThreePointArc((0, -0.02), (0.375, -0.02), (0.745, -0.019364917))
            Line((0.745, -0.019364917), (0.75, 0))
        make_face()
    fillet1_piece_6 = extrude(amount=5.334817848, mode=Mode.PRIVATE)
    fillet1_piece_6 = split(fillet1_piece_6, bisect_by=Plane(origin=(-4.620408244, -15.128632193, 0.701712982), z_dir=(0, 0, -1)), keep=Keep.TOP, mode=Mode.PRIVATE)
    fillet1_piece_6 = split(fillet1_piece_6, bisect_by=Plane(origin=(-4.620408244, -15.128632193, 0.208426284), z_dir=(0, 0, 1)), keep=Keep.TOP, mode=Mode.PRIVATE)
    add(fillet1_piece_6)

    # Sketch9 → Cut-Extrude7 (cut, two sides: drawn at the far end of the back side and taken through both)
    with BuildSketch(Plane.XY.offset(0.701712982).offset(-CUT_EXTRUDE7_DEPTH_BACK)):
        with Locations((0, -25.5)):
            Rectangle(SKETCH9_W, SKETCH9_H)
    extrude(amount=CUT_EXTRUDE7_DEPTH + CUT_EXTRUDE7_DEPTH_BACK, mode=Mode.SUBTRACT)

    # Sketch12 → Boss-Extrude5 (add, along a direction that is not the sketch's normal)
    with BuildSketch(Plane.XZ.offset(18)):
        with Locations((5.31, 0.455069633)):
            Rectangle(SKETCH12_W, SKETCH12_H)
        with Locations((0, 0.455069633)):
            Rectangle(SKETCH12_W, SKETCH12_H)
        with Locations((-5.31, 0.455069633)):
            Rectangle(SKETCH12_W, SKETCH12_H)
    extrude(amount=BOSS_EXTRUDE5_DEPTH, dir=(0, -0.984807753012208, 0.17364817766693055))


solid = part_2.part
